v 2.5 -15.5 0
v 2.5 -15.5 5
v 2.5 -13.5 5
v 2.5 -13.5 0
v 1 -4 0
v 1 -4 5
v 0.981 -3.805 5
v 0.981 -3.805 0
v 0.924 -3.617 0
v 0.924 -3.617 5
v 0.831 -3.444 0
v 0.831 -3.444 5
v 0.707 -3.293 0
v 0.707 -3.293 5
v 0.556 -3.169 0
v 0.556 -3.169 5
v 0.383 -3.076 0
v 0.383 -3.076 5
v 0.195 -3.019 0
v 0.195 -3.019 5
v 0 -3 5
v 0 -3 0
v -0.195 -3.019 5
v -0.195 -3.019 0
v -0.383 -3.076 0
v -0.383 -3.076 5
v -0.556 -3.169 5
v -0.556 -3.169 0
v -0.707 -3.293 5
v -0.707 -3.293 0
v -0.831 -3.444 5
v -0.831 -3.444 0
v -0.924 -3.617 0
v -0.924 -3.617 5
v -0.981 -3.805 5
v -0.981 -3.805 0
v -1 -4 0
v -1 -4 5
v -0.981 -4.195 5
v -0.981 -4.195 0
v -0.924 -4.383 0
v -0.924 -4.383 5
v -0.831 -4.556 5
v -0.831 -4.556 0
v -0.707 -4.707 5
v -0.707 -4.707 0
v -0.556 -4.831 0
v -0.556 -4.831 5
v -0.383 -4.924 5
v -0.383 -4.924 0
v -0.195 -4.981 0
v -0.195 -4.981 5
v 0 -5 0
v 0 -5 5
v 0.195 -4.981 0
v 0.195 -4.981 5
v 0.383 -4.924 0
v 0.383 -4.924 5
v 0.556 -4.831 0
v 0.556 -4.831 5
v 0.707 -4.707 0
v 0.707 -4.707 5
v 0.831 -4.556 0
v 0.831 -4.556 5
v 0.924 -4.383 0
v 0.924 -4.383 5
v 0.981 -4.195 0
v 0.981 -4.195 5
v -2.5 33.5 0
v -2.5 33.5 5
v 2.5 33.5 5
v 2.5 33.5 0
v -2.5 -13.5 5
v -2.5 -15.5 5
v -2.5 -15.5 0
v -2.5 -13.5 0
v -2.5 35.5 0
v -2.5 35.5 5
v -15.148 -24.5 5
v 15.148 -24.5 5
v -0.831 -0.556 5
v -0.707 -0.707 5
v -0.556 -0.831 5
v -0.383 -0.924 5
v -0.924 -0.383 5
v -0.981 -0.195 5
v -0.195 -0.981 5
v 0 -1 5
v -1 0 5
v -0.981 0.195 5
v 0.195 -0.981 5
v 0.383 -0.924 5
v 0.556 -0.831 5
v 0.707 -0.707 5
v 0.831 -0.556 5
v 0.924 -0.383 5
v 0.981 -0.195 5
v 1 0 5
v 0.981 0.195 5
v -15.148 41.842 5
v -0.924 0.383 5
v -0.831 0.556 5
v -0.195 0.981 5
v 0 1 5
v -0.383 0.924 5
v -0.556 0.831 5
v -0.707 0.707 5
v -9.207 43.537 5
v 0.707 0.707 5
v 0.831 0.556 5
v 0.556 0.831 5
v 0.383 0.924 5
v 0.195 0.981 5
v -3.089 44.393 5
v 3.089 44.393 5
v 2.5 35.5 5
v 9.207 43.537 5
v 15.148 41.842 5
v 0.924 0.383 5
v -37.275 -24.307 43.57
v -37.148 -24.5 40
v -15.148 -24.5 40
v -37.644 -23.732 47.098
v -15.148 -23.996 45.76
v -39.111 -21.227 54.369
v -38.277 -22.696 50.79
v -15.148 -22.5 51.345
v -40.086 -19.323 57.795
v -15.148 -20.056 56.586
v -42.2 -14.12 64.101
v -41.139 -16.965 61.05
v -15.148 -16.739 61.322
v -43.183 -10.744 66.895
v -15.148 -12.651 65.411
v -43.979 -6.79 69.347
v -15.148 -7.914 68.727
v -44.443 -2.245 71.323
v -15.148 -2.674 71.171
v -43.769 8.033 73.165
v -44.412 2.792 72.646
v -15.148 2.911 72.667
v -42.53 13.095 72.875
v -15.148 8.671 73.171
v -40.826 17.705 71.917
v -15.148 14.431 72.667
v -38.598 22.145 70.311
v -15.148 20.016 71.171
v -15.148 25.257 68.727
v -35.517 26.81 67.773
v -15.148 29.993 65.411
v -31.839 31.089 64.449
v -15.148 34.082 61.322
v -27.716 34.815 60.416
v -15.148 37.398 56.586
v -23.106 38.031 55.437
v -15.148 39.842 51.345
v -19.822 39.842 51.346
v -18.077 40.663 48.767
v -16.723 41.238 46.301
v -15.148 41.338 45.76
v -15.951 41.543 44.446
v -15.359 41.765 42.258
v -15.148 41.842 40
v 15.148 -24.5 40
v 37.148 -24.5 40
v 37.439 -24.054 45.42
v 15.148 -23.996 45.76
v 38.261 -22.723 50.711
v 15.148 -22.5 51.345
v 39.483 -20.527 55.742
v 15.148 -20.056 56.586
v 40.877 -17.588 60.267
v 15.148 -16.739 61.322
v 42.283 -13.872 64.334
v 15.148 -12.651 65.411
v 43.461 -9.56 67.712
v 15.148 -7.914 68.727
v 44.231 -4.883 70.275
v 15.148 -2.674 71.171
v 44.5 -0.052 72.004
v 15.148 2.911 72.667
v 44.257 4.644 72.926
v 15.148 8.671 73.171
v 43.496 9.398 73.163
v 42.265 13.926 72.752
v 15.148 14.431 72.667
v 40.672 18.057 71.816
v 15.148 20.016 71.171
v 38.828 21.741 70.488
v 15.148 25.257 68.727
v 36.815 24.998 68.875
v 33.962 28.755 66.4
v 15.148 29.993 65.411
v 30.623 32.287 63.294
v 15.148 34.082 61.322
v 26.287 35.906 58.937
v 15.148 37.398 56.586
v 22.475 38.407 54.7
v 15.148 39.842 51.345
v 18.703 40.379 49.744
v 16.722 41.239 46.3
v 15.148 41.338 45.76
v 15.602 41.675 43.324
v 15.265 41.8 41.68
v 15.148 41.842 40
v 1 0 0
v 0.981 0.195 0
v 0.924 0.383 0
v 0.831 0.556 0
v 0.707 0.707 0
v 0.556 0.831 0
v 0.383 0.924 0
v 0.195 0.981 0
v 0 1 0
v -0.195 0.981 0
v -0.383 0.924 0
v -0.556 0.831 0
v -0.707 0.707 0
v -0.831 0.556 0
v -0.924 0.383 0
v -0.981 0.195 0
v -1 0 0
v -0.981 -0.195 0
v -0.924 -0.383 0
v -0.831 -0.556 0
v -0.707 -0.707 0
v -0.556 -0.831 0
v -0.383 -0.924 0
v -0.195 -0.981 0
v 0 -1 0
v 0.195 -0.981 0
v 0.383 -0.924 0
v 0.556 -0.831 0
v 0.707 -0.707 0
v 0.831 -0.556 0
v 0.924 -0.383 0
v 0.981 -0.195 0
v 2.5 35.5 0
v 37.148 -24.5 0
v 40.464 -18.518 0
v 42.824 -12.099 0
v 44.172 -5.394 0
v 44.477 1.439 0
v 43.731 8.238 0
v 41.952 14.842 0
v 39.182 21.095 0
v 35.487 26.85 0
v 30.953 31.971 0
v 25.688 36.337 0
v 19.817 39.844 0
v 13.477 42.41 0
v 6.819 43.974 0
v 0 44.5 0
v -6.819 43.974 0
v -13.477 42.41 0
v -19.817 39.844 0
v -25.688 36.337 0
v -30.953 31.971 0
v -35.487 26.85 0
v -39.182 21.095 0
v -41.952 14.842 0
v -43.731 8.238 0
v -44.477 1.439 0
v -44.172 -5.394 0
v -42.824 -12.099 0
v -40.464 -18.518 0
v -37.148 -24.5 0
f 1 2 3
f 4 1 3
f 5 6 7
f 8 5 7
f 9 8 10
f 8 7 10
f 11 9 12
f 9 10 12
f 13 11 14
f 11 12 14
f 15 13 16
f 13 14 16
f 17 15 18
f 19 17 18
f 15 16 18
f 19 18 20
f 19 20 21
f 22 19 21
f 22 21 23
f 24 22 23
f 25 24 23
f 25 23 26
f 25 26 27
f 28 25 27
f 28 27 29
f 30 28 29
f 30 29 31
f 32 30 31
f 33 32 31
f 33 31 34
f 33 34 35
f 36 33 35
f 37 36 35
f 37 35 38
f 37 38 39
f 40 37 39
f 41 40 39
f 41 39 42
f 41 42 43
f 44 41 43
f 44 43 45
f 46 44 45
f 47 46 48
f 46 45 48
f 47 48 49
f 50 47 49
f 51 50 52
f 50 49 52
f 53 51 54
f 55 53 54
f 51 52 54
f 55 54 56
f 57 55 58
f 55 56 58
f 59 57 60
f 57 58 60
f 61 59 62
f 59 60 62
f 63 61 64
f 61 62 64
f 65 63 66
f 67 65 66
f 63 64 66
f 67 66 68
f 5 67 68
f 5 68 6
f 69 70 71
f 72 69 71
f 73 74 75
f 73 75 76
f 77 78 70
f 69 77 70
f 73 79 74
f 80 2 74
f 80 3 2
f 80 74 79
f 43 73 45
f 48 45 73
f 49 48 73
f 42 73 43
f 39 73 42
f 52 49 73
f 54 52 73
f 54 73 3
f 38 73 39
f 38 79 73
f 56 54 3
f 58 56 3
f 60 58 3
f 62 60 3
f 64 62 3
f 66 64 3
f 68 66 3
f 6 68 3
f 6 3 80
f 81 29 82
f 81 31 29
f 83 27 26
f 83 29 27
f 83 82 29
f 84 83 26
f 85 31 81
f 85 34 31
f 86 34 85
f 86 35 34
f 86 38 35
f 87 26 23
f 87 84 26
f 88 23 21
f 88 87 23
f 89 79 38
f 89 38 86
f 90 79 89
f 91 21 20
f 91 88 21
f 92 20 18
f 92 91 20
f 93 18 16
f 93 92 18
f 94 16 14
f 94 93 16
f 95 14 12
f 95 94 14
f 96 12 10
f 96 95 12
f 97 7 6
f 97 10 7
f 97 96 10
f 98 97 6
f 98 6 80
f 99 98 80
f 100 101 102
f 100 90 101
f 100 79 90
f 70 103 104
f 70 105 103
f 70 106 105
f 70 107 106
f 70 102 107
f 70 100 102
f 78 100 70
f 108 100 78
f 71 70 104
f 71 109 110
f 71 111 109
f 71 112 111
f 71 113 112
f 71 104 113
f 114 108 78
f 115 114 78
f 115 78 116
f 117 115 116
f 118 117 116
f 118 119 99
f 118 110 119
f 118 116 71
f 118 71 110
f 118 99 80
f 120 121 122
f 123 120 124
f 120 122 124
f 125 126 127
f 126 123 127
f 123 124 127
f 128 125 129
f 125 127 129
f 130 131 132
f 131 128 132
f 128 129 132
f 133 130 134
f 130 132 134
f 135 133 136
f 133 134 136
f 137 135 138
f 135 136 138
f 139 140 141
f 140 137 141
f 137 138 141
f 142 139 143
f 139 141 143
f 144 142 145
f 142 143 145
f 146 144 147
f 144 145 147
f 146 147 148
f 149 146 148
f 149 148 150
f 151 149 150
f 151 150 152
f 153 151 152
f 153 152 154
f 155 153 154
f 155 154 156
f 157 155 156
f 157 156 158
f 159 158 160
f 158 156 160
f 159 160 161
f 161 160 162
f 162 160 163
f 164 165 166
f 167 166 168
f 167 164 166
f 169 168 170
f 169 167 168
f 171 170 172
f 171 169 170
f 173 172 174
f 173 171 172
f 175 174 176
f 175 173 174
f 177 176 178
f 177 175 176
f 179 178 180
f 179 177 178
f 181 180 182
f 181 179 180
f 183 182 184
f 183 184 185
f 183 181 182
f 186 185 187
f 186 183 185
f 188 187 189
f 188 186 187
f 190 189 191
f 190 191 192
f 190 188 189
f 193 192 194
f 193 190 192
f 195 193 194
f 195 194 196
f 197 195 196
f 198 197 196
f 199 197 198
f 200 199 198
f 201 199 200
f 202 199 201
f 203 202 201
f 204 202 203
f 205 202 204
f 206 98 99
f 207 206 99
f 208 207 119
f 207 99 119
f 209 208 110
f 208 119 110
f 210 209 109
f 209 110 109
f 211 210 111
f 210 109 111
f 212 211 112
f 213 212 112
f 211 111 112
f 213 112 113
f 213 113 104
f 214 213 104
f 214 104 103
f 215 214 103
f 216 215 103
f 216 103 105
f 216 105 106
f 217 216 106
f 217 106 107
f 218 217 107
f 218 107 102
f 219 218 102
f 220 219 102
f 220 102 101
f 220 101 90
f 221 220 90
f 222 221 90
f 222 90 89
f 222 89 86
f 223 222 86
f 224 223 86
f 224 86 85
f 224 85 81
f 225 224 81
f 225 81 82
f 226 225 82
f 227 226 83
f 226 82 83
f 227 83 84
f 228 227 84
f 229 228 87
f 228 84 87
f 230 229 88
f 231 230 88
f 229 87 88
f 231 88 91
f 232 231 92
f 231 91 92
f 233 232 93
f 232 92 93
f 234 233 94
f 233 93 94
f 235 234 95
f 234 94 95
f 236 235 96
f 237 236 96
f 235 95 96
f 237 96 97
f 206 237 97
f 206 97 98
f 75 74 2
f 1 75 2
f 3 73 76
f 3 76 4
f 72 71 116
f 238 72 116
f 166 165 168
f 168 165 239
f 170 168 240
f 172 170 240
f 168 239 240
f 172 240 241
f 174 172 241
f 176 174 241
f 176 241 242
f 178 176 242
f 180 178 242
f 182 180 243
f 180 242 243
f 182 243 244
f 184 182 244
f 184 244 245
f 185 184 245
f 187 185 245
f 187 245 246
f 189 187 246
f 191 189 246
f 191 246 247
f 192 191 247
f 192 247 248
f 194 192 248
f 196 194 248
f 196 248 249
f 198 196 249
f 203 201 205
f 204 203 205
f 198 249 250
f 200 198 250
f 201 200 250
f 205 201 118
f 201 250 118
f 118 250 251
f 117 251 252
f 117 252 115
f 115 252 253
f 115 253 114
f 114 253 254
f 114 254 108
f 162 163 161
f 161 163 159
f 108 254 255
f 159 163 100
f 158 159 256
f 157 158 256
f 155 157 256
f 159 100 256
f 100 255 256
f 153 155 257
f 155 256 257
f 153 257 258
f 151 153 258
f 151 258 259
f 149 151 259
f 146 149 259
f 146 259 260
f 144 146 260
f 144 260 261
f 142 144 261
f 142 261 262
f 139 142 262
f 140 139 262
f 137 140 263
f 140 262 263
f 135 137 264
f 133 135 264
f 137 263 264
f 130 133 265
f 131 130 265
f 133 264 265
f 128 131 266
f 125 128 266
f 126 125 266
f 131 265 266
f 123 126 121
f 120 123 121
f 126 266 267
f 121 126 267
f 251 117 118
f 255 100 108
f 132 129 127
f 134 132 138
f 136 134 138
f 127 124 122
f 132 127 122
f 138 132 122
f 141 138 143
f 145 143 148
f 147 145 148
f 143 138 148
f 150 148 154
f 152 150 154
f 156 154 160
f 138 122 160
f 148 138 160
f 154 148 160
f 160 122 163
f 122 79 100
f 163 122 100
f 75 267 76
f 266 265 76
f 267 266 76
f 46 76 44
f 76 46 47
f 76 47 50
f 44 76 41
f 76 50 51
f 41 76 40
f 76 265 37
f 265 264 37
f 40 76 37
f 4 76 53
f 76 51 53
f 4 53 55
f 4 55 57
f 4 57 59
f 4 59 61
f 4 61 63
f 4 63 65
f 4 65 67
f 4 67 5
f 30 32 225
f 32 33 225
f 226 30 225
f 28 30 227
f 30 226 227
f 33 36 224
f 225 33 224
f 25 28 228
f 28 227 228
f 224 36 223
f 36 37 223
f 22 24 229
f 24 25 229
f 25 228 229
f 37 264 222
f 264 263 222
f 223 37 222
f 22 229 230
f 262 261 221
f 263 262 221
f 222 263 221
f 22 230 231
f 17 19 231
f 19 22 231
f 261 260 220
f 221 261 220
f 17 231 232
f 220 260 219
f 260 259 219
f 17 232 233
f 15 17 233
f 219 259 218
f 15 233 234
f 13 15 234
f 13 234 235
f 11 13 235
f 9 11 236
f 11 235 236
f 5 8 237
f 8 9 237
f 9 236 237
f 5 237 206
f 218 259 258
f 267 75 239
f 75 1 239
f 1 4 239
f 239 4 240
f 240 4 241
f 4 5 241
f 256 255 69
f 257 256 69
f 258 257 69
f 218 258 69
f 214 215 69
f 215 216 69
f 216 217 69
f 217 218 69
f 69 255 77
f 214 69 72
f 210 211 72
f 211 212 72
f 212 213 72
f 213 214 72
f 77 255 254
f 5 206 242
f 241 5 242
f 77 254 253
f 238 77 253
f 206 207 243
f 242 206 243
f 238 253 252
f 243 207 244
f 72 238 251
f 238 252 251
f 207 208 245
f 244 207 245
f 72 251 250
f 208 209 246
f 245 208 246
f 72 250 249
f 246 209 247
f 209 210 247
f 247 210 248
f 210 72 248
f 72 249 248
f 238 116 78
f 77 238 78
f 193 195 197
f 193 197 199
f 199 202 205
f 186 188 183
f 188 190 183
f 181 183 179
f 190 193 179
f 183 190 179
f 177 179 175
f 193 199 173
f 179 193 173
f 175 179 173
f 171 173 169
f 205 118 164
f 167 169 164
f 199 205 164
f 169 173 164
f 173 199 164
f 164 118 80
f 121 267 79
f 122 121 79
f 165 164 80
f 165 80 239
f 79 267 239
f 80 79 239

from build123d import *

# Parameters (mm, degrees)
F1_DEPTH  = 5
F3_DEPTH  = 70
F5_DEPTH  = 29.352648758
F6_DEPTH  = 59.649351342
F7_W      = 5
F7_H      = 2
F8_DEPTH  = 5.0010001
F9_R      = 1
F10_DEPTH = 5.0010001


with BuildPart() as f1:
    # F0 (on Top) → F1 (new body)
    with BuildSketch(Plane.XY):
        with BuildLine():
            ThreePointArc((37.148351242, -24.5), (0, 44.5), (-37.148351242, -24.5))
            Line((-37.148351242, -24.5), (37.148351242, -24.5))
        make_face()
    extrude(amount=F1_DEPTH)

    # F2 (on face) → F3 (join)
    with BuildSketch(Plane.XY.offset(5)):
        with BuildLine():
            ThreePointArc((-15.148351242, 41.8422926553), (-42.2381488866, 14.0067404715), (-37.148351242, -24.5))
            Line((-37.148351242, -24.5), (-15.148351242, -24.5))
            Line((-15.148351242, -24.5), (-15.148351242, 41.8422926553))
        make_face()
        with BuildLine():
            Line((15.148351242, 41.8422926553), (15.148351242, -24.5))
            Line((15.148351242, -24.5), (37.148351242, -24.5))
            ThreePointArc((37.148351242, -24.5), (42.2381488866, 14.0067404715), (15.148351242, 41.8422926553))
        make_face()
    extrude(amount=F3_DEPTH)

    # F4 (on face) → F5 (cut, through all)
    with BuildSketch(Plane.YZ.offset(-15.148351242)):
        with BuildLine():
            ThreePointArc((-24.5, 40), (8.6711463276, 73.1711463276), (41.8422926553, 40))
            Line((41.8422926553, 40), (58.5, 40))
            Line((58.5, 40), (58.5, 90))
            Line((58.5, 90), (-45.5, 90))
            Line((-45.5, 90), (-45.5, 40))
            Line((-45.5, 40), (-24.5, 40))
        make_face()
    extrude(amount=-F5_DEPTH, mode=Mode.SUBTRACT)

    # F4 (on face) → F6 (cut, through all)
    with BuildSketch(Plane.YZ.offset(-15.148351242)):
        with BuildLine():
            ThreePointArc((-24.5, 40), (8.6711463276, 73.1711463276), (41.8422926553, 40))
            Line((41.8422926553, 40), (58.5, 40))
            Line((58.5, 40), (58.5, 90))
            Line((58.5, 90), (-45.5, 90))
            Line((-45.5, 90), (-45.5, 40))
            Line((-45.5, 40), (-24.5, 40))
        make_face()
    extrude(amount=F6_DEPTH, mode=Mode.SUBTRACT)

    # F7 (on face) → F8 (cut, through all)
    with BuildSketch(Plane.XY.offset(5)):
        Polygon((-2.5, 33.5), (0, 33.5), (2.5, 33.5), (2.5, 35.5), (-2.5, 35.5), align=None)
        with Locations((0, -14.5)):
            Rectangle(F7_W, F7_H)
    extrude(amount=-F8_DEPTH, mode=Mode.SUBTRACT)

    # F9 (on face) → F10 (cut, through all)
    with BuildSketch(Plane.XY.offset(5)):
        Circle(F9_R)
        with Locations((0, -4)):
            Circle(F9_R)
    extrude(amount=-F10_DEPTH, mode=Mode.SUBTRACT)


solid = f1.part
